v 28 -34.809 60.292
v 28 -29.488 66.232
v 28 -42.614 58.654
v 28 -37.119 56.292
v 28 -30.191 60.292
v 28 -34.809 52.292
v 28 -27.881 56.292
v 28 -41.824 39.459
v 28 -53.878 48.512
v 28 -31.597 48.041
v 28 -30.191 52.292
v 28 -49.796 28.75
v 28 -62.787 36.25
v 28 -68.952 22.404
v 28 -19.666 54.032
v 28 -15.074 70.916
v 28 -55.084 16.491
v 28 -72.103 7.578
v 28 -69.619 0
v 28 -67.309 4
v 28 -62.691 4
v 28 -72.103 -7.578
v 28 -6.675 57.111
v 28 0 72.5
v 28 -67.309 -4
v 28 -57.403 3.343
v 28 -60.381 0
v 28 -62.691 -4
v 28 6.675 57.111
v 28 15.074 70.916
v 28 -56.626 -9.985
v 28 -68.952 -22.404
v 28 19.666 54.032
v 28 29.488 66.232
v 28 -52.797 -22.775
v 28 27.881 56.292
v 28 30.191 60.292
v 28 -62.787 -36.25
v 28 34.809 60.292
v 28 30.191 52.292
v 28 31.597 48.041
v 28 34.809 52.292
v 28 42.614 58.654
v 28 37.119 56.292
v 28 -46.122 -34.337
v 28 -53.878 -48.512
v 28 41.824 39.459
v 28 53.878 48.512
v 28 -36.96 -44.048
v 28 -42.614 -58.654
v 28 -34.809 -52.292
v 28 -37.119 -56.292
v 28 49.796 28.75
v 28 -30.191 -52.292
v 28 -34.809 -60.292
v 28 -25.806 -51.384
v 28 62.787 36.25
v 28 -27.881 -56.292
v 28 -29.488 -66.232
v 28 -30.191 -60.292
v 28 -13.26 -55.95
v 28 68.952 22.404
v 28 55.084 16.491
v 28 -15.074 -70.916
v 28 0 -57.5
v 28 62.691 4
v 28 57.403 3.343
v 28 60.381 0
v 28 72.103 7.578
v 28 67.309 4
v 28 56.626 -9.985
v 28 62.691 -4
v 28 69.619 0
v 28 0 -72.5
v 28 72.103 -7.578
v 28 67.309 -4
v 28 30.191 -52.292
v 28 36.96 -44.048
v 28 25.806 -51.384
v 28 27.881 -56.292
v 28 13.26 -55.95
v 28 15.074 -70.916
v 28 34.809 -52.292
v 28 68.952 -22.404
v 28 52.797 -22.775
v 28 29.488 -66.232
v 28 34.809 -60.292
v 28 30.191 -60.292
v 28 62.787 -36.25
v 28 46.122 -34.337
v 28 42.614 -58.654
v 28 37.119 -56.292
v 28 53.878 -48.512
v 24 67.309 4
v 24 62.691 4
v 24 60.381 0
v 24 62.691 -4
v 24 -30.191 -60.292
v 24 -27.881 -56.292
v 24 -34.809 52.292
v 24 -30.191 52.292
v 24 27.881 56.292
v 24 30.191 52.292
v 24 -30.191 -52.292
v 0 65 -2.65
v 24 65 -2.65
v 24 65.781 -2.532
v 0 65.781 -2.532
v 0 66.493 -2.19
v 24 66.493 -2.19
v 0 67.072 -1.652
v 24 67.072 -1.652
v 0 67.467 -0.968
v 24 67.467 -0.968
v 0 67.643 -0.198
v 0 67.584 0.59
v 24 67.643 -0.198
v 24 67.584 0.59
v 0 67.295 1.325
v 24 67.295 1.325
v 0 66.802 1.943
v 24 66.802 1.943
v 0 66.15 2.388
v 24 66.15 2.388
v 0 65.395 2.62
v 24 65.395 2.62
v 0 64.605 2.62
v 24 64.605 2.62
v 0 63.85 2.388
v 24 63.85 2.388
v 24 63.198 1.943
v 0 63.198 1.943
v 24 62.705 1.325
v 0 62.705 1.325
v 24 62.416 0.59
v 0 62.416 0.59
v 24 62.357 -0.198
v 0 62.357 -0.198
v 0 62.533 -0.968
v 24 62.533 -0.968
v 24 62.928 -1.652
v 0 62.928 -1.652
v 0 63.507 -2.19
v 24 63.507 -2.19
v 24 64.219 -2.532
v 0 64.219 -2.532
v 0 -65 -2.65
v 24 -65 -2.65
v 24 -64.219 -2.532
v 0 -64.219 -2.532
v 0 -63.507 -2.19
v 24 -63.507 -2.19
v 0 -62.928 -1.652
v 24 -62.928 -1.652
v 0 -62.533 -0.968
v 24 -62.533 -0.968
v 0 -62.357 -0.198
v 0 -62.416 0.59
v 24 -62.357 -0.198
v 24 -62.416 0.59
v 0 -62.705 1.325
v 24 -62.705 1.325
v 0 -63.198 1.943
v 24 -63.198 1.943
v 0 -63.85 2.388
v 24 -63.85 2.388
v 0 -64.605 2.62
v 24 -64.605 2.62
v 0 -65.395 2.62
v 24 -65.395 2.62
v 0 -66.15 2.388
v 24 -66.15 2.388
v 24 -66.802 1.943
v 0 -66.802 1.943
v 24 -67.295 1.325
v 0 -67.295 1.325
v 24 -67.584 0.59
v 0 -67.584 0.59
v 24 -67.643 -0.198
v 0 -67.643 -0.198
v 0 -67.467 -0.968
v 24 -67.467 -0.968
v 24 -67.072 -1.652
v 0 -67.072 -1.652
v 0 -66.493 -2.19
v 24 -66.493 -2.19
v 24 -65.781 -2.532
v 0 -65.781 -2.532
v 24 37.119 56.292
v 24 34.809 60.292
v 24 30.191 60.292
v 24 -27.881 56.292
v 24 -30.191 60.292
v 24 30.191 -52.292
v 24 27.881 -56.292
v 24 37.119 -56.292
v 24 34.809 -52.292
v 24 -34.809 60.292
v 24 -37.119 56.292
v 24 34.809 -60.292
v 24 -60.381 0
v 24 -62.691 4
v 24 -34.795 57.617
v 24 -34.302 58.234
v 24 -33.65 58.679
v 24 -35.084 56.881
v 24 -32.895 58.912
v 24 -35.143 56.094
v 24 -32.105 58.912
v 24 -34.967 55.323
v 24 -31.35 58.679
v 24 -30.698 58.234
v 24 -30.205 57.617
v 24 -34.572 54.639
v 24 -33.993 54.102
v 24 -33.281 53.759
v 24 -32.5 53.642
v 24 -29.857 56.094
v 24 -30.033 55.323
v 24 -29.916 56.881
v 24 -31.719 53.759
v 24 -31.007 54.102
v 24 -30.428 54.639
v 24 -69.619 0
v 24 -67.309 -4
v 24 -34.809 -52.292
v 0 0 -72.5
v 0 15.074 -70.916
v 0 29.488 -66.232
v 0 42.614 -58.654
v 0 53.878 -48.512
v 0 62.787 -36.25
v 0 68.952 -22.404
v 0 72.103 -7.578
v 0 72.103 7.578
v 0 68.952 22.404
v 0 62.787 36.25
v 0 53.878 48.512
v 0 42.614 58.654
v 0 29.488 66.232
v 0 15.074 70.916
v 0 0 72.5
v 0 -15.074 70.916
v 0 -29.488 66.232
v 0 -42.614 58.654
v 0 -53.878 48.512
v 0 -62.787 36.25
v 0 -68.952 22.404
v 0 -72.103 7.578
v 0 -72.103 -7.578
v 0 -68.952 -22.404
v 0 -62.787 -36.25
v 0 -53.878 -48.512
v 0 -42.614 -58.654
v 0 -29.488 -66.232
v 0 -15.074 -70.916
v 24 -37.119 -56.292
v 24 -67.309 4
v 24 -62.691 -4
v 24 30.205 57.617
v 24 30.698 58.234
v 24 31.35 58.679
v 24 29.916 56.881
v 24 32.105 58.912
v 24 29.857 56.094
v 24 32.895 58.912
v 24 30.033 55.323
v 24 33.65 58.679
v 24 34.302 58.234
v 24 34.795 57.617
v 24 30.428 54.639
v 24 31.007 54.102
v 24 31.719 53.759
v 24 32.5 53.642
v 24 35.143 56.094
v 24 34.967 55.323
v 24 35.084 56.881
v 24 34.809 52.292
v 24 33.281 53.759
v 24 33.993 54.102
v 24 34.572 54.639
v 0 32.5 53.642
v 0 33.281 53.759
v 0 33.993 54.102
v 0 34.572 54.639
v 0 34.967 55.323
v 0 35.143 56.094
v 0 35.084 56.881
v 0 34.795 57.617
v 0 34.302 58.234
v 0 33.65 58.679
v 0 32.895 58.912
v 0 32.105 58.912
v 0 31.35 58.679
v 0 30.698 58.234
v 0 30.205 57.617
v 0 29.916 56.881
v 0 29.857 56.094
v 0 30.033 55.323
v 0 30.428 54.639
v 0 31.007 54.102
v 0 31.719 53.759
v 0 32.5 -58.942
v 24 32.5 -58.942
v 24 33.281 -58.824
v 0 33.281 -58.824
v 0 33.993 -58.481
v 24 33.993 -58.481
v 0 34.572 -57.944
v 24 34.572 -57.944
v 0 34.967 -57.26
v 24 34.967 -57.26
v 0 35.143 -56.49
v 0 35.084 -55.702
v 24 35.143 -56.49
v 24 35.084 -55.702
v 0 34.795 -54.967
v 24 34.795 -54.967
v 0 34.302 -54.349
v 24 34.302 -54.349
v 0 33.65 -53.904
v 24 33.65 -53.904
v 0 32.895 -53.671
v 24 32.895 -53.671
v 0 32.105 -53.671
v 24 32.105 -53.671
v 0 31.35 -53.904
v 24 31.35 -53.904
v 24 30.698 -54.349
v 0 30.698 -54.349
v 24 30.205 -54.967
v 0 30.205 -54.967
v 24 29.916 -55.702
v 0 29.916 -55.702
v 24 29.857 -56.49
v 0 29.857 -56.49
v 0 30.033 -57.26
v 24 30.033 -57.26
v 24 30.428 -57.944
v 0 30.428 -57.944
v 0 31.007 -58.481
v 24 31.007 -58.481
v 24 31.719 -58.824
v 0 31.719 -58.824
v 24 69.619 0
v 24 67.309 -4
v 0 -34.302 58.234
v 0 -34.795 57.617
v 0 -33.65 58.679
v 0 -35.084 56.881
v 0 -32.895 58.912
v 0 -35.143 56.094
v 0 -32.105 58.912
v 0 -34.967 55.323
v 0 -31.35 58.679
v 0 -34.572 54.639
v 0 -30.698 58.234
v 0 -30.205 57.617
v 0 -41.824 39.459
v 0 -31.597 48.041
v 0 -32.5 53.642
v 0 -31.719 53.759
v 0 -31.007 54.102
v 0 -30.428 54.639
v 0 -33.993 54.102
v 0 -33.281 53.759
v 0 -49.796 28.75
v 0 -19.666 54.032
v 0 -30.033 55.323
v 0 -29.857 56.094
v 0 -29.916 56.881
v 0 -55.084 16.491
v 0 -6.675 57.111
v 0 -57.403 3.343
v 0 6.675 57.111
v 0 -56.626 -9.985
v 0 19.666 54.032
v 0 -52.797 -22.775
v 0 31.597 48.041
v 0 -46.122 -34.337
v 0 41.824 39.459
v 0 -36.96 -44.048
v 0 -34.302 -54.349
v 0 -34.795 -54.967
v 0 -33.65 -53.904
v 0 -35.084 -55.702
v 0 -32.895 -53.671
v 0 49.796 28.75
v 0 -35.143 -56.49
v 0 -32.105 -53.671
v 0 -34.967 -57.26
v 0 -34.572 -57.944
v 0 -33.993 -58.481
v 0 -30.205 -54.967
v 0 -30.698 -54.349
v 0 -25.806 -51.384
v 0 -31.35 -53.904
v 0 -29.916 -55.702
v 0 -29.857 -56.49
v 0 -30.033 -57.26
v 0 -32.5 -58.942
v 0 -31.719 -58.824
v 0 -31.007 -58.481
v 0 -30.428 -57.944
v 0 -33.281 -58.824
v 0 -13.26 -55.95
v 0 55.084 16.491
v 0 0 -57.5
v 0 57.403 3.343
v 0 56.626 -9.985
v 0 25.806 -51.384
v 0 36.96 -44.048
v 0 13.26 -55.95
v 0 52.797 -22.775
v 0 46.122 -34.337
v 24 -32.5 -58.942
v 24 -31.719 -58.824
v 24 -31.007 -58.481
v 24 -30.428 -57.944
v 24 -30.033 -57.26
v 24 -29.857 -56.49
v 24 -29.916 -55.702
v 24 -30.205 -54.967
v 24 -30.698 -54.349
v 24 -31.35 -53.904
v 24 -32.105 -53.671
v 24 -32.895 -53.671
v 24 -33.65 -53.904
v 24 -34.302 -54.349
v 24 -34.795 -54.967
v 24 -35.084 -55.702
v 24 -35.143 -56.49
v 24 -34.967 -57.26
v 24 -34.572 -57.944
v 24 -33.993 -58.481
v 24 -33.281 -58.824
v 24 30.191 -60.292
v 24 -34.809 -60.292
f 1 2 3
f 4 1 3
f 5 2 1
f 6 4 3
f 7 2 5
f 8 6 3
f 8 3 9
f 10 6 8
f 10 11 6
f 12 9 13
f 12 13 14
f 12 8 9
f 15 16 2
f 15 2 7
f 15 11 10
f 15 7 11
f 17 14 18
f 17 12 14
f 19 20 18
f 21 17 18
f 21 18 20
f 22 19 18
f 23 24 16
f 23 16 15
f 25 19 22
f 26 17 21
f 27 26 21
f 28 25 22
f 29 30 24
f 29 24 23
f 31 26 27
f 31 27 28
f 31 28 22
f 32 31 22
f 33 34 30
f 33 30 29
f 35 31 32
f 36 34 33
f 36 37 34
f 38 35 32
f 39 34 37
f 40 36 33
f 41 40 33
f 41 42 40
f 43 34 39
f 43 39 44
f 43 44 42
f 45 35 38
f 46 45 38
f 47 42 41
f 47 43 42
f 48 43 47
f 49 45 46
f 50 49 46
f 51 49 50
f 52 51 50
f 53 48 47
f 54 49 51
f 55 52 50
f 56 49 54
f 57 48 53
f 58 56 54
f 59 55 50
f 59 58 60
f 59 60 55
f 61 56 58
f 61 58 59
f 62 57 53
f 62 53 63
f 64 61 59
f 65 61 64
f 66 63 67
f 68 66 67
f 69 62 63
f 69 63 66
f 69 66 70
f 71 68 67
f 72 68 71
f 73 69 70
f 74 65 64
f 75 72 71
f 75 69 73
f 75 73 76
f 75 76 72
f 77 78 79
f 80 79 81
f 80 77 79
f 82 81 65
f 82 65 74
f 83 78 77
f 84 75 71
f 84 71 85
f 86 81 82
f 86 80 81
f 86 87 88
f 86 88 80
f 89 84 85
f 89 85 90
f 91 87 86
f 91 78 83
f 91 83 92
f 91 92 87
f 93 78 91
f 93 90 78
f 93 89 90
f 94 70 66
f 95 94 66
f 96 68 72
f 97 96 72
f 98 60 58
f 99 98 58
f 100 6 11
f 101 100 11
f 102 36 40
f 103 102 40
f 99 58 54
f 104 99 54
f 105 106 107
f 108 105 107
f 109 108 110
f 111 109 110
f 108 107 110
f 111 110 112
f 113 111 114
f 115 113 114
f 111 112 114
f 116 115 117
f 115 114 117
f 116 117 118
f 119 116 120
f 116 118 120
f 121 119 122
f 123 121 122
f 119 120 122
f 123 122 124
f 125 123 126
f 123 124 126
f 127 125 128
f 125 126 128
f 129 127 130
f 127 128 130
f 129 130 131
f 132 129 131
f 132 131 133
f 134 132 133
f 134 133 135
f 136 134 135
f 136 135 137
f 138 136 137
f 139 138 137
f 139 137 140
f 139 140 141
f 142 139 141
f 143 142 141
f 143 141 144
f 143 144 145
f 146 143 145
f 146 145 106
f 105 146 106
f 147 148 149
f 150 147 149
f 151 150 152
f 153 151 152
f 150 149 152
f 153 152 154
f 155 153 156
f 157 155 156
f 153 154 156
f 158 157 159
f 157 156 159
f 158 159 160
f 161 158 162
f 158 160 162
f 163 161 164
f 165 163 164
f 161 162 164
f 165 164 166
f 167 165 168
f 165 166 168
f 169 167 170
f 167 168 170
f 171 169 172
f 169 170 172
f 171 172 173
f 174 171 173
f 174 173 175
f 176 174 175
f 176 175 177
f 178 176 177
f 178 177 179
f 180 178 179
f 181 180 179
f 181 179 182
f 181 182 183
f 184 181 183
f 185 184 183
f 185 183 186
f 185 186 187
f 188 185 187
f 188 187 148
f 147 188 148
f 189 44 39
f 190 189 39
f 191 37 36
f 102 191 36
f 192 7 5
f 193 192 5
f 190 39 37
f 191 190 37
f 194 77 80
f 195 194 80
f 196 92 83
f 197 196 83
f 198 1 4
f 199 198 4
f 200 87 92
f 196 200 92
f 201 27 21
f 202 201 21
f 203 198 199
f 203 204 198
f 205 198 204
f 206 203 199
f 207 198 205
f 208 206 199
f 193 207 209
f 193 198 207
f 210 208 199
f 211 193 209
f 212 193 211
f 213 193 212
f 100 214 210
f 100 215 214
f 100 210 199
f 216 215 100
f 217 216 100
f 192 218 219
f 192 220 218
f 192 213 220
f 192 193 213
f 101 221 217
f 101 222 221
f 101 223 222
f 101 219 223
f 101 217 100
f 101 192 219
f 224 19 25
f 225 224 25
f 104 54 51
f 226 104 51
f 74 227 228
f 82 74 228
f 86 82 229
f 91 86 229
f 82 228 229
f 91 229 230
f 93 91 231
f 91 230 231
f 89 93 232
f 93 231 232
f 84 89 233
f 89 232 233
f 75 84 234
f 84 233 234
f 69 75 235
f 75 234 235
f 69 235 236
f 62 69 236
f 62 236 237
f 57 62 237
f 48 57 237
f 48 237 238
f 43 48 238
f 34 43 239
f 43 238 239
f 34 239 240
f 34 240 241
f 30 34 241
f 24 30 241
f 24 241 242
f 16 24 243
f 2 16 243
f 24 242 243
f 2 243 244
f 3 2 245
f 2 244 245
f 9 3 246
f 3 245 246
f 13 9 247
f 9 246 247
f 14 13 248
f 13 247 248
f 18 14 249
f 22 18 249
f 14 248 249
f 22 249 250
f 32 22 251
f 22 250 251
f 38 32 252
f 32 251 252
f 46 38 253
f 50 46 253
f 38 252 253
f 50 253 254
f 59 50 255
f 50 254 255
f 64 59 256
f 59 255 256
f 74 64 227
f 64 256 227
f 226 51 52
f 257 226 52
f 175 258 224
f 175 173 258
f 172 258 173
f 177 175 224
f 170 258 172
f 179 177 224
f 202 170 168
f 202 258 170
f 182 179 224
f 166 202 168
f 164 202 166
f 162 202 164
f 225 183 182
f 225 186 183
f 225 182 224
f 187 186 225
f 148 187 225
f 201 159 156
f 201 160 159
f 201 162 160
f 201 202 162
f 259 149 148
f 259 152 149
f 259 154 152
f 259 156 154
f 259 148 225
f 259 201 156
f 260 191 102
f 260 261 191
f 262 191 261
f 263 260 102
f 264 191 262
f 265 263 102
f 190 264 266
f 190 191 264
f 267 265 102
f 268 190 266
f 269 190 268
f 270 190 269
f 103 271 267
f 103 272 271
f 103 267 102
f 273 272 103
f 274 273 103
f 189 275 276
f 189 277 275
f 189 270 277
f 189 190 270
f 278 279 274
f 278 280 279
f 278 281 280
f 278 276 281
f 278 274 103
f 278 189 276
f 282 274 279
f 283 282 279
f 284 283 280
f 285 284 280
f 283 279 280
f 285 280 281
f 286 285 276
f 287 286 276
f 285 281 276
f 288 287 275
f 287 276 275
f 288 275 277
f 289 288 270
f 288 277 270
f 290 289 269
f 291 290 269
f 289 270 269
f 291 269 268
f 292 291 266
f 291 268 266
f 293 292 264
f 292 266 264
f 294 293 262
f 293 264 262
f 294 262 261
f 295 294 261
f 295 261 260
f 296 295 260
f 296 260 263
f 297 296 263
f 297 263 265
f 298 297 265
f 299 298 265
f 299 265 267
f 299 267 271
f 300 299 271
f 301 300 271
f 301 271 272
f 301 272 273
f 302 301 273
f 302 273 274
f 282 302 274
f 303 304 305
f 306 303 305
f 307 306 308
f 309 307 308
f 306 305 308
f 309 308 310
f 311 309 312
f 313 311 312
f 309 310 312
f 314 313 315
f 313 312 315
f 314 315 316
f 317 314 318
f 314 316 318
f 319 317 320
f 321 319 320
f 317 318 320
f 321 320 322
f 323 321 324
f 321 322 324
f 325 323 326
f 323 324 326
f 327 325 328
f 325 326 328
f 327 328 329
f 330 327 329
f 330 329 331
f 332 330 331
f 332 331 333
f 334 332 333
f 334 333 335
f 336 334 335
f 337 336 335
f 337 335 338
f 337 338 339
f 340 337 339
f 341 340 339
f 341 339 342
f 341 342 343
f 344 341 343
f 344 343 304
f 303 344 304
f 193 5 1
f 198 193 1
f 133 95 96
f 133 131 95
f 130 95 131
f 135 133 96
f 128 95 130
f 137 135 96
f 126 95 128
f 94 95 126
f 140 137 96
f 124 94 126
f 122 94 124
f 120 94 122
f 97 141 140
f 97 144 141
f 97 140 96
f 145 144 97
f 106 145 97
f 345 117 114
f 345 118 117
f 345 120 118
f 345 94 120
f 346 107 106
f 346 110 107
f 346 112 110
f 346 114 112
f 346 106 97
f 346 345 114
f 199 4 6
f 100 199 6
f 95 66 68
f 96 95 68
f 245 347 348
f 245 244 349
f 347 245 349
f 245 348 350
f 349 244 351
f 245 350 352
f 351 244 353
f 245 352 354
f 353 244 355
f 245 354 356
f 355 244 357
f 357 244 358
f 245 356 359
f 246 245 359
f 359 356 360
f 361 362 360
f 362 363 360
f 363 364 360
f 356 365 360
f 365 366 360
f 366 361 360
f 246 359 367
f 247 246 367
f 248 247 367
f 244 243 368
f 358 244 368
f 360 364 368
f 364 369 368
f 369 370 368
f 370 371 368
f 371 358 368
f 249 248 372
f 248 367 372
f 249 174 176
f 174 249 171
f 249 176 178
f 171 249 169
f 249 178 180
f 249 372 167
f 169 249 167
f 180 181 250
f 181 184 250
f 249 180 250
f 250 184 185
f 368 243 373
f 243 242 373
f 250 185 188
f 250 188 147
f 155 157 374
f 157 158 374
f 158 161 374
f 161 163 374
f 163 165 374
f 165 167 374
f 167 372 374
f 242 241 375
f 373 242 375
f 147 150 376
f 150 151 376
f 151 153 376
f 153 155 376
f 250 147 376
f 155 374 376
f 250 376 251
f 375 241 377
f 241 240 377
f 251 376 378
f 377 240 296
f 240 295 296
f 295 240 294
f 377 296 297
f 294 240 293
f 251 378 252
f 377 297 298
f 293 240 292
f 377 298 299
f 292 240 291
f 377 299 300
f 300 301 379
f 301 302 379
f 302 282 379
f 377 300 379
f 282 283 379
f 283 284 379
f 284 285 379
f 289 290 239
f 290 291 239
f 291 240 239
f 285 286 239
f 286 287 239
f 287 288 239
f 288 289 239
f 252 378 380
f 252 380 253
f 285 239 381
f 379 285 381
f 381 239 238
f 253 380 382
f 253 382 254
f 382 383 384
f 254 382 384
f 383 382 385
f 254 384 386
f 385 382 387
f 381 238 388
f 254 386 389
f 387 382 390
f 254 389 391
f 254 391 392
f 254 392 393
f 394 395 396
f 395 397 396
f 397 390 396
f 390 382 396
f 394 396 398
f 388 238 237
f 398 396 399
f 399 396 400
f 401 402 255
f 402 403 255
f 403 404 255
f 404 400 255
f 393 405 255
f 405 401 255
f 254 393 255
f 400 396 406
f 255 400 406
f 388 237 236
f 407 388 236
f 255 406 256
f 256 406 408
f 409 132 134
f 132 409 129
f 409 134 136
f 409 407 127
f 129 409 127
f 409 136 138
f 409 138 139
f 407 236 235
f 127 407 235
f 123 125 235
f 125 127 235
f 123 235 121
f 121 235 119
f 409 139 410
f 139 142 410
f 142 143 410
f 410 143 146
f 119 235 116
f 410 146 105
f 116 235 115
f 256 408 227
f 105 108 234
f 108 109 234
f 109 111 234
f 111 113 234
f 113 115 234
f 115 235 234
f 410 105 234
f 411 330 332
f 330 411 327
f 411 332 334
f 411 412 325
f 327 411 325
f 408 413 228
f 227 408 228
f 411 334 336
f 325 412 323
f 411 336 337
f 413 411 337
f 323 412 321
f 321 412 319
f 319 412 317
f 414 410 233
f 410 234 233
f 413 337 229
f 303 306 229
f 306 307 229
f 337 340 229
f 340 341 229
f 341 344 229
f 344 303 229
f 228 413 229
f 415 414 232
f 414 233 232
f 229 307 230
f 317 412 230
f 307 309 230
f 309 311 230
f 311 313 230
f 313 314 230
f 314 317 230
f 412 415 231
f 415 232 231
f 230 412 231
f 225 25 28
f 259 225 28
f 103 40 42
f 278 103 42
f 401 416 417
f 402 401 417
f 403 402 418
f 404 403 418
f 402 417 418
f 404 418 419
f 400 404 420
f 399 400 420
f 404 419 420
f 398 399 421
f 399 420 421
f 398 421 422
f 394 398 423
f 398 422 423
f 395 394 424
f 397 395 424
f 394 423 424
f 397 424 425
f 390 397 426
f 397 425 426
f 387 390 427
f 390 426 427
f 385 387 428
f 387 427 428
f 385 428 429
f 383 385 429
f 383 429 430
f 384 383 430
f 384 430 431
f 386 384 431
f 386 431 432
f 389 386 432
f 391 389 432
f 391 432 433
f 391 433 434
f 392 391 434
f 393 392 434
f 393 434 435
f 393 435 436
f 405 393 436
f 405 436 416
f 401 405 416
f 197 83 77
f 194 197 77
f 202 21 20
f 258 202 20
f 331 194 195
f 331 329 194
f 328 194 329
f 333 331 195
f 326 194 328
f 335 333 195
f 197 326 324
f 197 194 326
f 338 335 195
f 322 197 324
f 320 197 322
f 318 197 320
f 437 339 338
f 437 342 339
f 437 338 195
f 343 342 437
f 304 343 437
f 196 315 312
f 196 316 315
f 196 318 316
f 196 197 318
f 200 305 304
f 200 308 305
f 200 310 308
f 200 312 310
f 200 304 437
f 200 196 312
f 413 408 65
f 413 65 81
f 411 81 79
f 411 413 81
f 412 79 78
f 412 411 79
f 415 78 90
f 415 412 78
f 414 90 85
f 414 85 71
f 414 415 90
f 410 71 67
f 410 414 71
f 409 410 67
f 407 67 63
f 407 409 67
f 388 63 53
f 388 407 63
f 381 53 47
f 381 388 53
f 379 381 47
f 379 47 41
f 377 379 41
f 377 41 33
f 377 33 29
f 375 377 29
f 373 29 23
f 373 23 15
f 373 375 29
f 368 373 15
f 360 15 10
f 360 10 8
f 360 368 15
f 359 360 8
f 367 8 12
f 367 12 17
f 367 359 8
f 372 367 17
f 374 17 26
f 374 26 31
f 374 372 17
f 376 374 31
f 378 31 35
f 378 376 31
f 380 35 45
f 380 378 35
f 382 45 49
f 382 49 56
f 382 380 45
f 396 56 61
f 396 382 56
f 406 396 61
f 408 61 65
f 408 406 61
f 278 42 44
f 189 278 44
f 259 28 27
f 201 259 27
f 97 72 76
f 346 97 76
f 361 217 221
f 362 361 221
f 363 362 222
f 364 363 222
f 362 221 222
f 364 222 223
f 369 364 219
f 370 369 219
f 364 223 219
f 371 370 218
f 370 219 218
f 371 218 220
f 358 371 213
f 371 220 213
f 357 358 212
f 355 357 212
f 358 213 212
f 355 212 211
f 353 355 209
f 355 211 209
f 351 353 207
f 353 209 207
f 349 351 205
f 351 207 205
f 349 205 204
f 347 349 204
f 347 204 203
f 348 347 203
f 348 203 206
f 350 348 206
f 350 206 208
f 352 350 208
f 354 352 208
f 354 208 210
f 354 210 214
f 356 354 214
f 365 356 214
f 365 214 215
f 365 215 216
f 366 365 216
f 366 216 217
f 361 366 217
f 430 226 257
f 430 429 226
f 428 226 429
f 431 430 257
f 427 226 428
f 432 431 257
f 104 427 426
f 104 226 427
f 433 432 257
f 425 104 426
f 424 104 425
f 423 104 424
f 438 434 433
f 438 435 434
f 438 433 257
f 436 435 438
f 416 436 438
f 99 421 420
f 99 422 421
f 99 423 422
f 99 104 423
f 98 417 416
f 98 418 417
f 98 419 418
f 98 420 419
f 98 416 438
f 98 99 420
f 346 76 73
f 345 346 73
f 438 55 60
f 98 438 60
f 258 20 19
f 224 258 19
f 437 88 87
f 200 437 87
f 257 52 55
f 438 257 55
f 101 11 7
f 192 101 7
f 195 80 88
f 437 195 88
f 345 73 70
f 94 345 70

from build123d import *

# Parameters (mm, degrees)
SKETCH1_R           = 72.5
SKETCH1_R_2         = 57.5
BOSS_EXTRUDE1_DEPTH = 28
CUT_EXTRUDE1_DEPTH  = 4
CUT_EXTRUDE2_REACH  = 108.285
SKETCH3_R           = 2.65


with BuildPart() as part:
    # Sketch1 → Boss-Extrude1 (new body)
    with BuildSketch(Plane(origin=(0, 0, 0), x_dir=(0, 0, -1), z_dir=(1, 0, 0))):
        Circle(SKETCH1_R)
        Circle(SKETCH1_R_2, mode=Mode.SUBTRACT)
    extrude(amount=BOSS_EXTRUDE1_DEPTH)

    # Sketch2 → Cut-Extrude1 (cut)
    with BuildSketch(Plane(origin=(28, 0, 0), x_dir=(0, 0, -1), z_dir=(1, 0, 0))):
        Polygon((52.291651246, 30.190598923), (56.291651246, 27.881197846), (60.291651246, 30.190598923), (60.291651246, 34.809401077), (56.291651246, 37.118802154), (52.291651246, 34.809401077), align=None)
        Polygon((0, 60.381197846), (4, 62.690598923), (4, 67.309401077), (0, 69.618802154), (-4, 67.309401077), (-4, 62.690598923), align=None)
        Polygon((52.291651246, -30.190598923), (52.291651246, -34.809401077), (56.291651246, -37.118802154), (60.291651246, -34.809401077), (60.291651246, -30.190598923), (56.291651246, -27.881197846), align=None)
        Polygon((0, -60.381197846), (-4, -62.690598923), (-4, -67.309401077), (0, -69.618802154), (4, -67.309401077), (4, -62.690598923), align=None)
        Polygon((-52.291651246, -30.190598923), (-56.291651246, -27.881197846), (-60.291651246, -30.190598923), (-60.291651246, -34.809401077), (-56.291651246, -37.118802154), (-52.291651246, -34.809401077), align=None)
        Polygon((-52.291651246, 30.190598923), (-52.291651246, 34.809401077), (-56.291651246, 37.118802154), (-60.291651246, 34.809401077), (-60.291651246, 30.190598923), (-56.291651246, 27.881197846), align=None)
    extrude(amount=-CUT_EXTRUDE1_DEPTH, mode=Mode.SUBTRACT)

    # Sketch3 → Cut-Extrude2 (cut, up to next)
    with BuildSketch(Plane(origin=(28, 0, 0), x_dir=(0, 0, -1), z_dir=(1, 0, 0)), mode=Mode.PRIVATE) as cut_extrude2_sk1:
        with Locations((0, 65)):
            Circle(SKETCH3_R)
    cut_extrude2_tool1 = extrude(cut_extrude2_sk1.sketch, amount=-CUT_EXTRUDE2_REACH, mode=Mode.PRIVATE) & part.part
    # Sketch3 → Cut-Extrude2 (cut, up to next)
    with BuildSketch(Plane(origin=(28, 0, 0), x_dir=(0, 0, -1), z_dir=(1, 0, 0)), mode=Mode.PRIVATE) as cut_extrude2_sk2:
        with Locations((56.291651246, 32.5)):
            Circle(SKETCH3_R)
    cut_extrude2_tool2 = extrude(cut_extrude2_sk2.sketch, amount=-CUT_EXTRUDE2_REACH, mode=Mode.PRIVATE) & part.part
    # Sketch3 → Cut-Extrude2 (cut, up to next)
    with BuildSketch(Plane(origin=(28, 0, 0), x_dir=(0, 0, -1), z_dir=(1, 0, 0)), mode=Mode.PRIVATE) as cut_extrude2_sk3:
        with Locations((56.291651246, -32.5)):
            Circle(SKETCH3_R)
    cut_extrude2_tool3 = extrude(cut_extrude2_sk3.sketch, amount=-CUT_EXTRUDE2_REACH, mode=Mode.PRIVATE) & part.part
    # Sketch3 → Cut-Extrude2 (cut, up to next)
    with BuildSketch(Plane(origin=(28, 0, 0), x_dir=(0, 0, -1), z_dir=(1, 0, 0)), mode=Mode.PRIVATE) as cut_extrude2_sk4:
        with Locations((0, -65)):
            Circle(SKETCH3_R)
    cut_extrude2_tool4 = extrude(cut_extrude2_sk4.sketch, amount=-CUT_EXTRUDE2_REACH, mode=Mode.PRIVATE) & part.part
    # Sketch3 → Cut-Extrude2 (cut, up to next)
    with BuildSketch(Plane(origin=(28, 0, 0), x_dir=(0, 0, -1), z_dir=(1, 0, 0)), mode=Mode.PRIVATE) as cut_extrude2_sk5:
        with Locations((-56.291651246, -32.5)):
            Circle(SKETCH3_R)
    cut_extrude2_tool5 = extrude(cut_extrude2_sk5.sketch, amount=-CUT_EXTRUDE2_REACH, mode=Mode.PRIVATE) & part.part
    # Sketch3 → Cut-Extrude2 (cut, up to next)
    with BuildSketch(Plane(origin=(28, 0, 0), x_dir=(0, 0, -1), z_dir=(1, 0, 0)), mode=Mode.PRIVATE) as cut_extrude2_sk6:
        with Locations((-56.291651246, 32.5)):
            Circle(SKETCH3_R)
    cut_extrude2_tool6 = extrude(cut_extrude2_sk6.sketch, amount=-CUT_EXTRUDE2_REACH, mode=Mode.PRIVATE) & part.part
    add(cut_extrude2_tool1.solids().sort_by_distance((28, 65, 0))[0], mode=Mode.SUBTRACT)
    add(cut_extrude2_tool2.solids().sort_by_distance((28, 32.5, -56.291651))[0], mode=Mode.SUBTRACT)
    add(cut_extrude2_tool3.solids().sort_by_distance((28, -32.5, -56.291651))[0], mode=Mode.SUBTRACT)
    add(cut_extrude2_tool4.solids().sort_by_distance((28, -65, 0))[0], mode=Mode.SUBTRACT)
    add(cut_extrude2_tool5.solids().sort_by_distance((28, -32.5, 56.291651))[0], mode=Mode.SUBTRACT)
    add(cut_extrude2_tool6.solids().sort_by_distance((28, 32.5, 56.291651))[0], mode=Mode.SUBTRACT)


solid = part.part
